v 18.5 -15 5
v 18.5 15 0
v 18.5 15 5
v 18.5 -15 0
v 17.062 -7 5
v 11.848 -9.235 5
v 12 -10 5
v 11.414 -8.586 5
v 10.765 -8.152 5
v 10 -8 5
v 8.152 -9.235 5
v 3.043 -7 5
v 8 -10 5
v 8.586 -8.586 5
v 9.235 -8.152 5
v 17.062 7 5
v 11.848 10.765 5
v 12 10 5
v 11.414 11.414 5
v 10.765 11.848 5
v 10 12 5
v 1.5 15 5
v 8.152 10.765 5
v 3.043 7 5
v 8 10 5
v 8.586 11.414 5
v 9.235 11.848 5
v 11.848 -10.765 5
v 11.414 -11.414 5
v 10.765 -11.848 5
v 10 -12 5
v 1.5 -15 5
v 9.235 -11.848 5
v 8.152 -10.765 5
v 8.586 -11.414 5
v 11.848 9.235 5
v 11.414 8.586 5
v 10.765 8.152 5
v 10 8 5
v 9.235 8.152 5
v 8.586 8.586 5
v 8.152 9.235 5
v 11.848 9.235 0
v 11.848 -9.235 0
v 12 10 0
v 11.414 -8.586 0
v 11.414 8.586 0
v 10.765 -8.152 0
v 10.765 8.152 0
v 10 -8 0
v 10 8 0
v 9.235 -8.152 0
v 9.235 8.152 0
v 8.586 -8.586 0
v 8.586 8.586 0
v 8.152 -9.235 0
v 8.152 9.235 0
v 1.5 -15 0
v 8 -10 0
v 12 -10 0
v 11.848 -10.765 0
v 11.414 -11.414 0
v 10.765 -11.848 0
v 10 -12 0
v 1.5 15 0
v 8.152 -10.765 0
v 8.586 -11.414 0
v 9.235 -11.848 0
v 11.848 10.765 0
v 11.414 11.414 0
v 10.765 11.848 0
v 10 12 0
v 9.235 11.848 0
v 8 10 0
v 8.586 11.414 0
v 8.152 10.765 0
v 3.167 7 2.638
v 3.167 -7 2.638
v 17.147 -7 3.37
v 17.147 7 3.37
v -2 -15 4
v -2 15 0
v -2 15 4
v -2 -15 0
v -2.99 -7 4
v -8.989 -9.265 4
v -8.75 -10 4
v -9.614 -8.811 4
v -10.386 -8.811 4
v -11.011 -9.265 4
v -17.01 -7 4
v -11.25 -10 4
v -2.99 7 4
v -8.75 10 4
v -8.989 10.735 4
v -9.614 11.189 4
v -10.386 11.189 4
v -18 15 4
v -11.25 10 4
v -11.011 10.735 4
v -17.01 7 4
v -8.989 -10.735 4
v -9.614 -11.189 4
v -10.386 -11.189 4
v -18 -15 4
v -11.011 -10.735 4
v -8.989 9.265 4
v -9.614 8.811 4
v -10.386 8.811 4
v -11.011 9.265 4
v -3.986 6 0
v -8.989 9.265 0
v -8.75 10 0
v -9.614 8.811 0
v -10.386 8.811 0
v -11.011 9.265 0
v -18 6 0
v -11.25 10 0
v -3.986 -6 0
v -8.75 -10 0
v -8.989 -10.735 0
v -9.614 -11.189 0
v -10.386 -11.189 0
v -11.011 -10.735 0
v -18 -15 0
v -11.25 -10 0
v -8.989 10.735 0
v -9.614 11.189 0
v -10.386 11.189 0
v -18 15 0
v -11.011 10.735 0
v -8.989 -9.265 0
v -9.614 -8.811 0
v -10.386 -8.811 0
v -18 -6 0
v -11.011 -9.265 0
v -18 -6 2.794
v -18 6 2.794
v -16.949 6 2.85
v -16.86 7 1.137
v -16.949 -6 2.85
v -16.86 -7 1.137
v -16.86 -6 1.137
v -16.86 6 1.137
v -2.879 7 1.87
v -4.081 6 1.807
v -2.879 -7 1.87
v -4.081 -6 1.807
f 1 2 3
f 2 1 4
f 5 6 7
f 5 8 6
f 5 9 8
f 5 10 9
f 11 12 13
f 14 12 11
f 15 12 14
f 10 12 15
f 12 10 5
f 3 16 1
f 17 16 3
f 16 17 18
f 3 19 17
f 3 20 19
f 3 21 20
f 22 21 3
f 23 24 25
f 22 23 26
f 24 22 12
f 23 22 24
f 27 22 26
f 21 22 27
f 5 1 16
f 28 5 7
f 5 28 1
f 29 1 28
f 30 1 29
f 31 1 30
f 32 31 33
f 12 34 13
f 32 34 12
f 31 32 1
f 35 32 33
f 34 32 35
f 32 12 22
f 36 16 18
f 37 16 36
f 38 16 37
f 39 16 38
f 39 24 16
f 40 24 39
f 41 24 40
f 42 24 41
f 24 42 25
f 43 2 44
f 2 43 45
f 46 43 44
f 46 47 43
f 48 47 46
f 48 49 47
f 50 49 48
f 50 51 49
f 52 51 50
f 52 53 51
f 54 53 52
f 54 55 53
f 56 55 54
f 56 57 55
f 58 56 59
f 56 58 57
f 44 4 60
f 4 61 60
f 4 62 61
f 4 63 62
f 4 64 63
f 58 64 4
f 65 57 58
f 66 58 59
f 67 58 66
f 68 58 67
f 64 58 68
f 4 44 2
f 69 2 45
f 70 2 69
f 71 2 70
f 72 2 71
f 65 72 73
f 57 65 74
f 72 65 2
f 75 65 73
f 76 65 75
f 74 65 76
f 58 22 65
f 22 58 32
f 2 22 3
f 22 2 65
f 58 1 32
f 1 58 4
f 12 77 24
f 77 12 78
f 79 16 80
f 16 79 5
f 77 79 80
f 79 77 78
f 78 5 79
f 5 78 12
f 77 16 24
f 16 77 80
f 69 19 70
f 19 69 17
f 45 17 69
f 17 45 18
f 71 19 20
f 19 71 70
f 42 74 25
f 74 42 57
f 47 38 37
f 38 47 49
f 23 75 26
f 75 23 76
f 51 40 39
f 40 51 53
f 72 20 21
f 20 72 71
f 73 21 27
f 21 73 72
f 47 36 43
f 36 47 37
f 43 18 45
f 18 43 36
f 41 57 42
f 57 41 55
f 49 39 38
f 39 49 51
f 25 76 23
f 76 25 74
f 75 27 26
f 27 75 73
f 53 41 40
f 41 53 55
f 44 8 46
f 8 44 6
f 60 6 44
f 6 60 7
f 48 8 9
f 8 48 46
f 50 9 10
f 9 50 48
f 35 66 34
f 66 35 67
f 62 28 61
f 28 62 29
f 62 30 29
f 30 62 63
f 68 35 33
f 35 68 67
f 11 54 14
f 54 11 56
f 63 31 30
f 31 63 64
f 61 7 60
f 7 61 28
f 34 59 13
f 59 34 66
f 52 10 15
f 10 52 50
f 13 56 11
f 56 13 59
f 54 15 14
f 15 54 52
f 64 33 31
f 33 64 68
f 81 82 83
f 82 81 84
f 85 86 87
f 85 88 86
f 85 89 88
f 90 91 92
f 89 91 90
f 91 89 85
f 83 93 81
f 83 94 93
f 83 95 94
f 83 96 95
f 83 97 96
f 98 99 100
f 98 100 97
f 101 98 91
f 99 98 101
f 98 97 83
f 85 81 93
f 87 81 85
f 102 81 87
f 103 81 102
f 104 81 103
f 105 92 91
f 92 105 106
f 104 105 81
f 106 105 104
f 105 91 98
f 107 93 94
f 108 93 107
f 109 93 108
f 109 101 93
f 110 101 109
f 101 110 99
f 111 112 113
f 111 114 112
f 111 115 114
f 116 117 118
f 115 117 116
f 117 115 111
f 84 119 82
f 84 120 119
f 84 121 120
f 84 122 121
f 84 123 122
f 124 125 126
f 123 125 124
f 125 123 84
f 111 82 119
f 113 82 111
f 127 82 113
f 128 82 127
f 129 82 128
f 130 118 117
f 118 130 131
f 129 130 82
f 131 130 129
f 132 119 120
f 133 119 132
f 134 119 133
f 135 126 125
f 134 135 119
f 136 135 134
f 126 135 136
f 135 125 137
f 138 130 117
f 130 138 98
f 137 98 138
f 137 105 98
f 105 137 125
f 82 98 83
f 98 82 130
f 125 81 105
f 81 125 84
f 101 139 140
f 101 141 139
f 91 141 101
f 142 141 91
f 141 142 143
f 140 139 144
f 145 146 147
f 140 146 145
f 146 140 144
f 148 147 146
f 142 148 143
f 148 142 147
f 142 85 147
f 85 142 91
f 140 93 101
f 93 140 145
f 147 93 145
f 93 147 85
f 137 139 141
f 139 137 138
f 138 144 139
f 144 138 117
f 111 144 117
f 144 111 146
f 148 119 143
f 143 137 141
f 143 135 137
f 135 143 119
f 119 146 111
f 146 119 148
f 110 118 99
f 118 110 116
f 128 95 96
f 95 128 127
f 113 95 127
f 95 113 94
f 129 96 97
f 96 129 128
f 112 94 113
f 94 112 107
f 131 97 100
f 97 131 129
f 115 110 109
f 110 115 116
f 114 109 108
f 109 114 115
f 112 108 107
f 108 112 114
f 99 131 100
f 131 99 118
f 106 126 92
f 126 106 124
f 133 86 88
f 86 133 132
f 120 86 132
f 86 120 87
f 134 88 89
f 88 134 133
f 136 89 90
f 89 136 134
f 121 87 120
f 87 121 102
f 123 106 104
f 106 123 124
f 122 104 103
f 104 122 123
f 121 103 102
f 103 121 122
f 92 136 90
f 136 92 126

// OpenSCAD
// grating mounts

roll = -3;  // angle

$fa = 6;  // make holes roundish
$fs = 0.8;
////  inner mount (against wall)
difference(){
translate([10,0,2.5])
cube([17,30,5],center = true);
    translate([10,0,6])      // centered on top
    rotate([0,roll,0])
    cube([14,14,6], center = true);  // 3 mm depth
    translate([10,10,3])
    cylinder(8,d=4,center = true);
    translate([10,-10,3])
    cylinder(8,d=4,center = true);
}
//// outer mount (towards mirror)
difference(){
translate([-10,0,2])
cube([16,30,4],center = true);
    translate([-10,0,4])      // centered on top
    rotate([0,roll,0])
    cube([14,14,5], center = true);  // 3 mm depth
    translate([-14,0,0])      // centered 
    rotate([0,roll,0])
    cube([20,12,6], center = true);  // through the block
 //   translate([-18,0,0])
   // cube([5,11,4],center = true);

    translate([-10,10,3])
    cylinder(8,d=2.5,center = true);
    translate([-10,-10,3])
    cylinder(8,d=2.5,center = true);
}
